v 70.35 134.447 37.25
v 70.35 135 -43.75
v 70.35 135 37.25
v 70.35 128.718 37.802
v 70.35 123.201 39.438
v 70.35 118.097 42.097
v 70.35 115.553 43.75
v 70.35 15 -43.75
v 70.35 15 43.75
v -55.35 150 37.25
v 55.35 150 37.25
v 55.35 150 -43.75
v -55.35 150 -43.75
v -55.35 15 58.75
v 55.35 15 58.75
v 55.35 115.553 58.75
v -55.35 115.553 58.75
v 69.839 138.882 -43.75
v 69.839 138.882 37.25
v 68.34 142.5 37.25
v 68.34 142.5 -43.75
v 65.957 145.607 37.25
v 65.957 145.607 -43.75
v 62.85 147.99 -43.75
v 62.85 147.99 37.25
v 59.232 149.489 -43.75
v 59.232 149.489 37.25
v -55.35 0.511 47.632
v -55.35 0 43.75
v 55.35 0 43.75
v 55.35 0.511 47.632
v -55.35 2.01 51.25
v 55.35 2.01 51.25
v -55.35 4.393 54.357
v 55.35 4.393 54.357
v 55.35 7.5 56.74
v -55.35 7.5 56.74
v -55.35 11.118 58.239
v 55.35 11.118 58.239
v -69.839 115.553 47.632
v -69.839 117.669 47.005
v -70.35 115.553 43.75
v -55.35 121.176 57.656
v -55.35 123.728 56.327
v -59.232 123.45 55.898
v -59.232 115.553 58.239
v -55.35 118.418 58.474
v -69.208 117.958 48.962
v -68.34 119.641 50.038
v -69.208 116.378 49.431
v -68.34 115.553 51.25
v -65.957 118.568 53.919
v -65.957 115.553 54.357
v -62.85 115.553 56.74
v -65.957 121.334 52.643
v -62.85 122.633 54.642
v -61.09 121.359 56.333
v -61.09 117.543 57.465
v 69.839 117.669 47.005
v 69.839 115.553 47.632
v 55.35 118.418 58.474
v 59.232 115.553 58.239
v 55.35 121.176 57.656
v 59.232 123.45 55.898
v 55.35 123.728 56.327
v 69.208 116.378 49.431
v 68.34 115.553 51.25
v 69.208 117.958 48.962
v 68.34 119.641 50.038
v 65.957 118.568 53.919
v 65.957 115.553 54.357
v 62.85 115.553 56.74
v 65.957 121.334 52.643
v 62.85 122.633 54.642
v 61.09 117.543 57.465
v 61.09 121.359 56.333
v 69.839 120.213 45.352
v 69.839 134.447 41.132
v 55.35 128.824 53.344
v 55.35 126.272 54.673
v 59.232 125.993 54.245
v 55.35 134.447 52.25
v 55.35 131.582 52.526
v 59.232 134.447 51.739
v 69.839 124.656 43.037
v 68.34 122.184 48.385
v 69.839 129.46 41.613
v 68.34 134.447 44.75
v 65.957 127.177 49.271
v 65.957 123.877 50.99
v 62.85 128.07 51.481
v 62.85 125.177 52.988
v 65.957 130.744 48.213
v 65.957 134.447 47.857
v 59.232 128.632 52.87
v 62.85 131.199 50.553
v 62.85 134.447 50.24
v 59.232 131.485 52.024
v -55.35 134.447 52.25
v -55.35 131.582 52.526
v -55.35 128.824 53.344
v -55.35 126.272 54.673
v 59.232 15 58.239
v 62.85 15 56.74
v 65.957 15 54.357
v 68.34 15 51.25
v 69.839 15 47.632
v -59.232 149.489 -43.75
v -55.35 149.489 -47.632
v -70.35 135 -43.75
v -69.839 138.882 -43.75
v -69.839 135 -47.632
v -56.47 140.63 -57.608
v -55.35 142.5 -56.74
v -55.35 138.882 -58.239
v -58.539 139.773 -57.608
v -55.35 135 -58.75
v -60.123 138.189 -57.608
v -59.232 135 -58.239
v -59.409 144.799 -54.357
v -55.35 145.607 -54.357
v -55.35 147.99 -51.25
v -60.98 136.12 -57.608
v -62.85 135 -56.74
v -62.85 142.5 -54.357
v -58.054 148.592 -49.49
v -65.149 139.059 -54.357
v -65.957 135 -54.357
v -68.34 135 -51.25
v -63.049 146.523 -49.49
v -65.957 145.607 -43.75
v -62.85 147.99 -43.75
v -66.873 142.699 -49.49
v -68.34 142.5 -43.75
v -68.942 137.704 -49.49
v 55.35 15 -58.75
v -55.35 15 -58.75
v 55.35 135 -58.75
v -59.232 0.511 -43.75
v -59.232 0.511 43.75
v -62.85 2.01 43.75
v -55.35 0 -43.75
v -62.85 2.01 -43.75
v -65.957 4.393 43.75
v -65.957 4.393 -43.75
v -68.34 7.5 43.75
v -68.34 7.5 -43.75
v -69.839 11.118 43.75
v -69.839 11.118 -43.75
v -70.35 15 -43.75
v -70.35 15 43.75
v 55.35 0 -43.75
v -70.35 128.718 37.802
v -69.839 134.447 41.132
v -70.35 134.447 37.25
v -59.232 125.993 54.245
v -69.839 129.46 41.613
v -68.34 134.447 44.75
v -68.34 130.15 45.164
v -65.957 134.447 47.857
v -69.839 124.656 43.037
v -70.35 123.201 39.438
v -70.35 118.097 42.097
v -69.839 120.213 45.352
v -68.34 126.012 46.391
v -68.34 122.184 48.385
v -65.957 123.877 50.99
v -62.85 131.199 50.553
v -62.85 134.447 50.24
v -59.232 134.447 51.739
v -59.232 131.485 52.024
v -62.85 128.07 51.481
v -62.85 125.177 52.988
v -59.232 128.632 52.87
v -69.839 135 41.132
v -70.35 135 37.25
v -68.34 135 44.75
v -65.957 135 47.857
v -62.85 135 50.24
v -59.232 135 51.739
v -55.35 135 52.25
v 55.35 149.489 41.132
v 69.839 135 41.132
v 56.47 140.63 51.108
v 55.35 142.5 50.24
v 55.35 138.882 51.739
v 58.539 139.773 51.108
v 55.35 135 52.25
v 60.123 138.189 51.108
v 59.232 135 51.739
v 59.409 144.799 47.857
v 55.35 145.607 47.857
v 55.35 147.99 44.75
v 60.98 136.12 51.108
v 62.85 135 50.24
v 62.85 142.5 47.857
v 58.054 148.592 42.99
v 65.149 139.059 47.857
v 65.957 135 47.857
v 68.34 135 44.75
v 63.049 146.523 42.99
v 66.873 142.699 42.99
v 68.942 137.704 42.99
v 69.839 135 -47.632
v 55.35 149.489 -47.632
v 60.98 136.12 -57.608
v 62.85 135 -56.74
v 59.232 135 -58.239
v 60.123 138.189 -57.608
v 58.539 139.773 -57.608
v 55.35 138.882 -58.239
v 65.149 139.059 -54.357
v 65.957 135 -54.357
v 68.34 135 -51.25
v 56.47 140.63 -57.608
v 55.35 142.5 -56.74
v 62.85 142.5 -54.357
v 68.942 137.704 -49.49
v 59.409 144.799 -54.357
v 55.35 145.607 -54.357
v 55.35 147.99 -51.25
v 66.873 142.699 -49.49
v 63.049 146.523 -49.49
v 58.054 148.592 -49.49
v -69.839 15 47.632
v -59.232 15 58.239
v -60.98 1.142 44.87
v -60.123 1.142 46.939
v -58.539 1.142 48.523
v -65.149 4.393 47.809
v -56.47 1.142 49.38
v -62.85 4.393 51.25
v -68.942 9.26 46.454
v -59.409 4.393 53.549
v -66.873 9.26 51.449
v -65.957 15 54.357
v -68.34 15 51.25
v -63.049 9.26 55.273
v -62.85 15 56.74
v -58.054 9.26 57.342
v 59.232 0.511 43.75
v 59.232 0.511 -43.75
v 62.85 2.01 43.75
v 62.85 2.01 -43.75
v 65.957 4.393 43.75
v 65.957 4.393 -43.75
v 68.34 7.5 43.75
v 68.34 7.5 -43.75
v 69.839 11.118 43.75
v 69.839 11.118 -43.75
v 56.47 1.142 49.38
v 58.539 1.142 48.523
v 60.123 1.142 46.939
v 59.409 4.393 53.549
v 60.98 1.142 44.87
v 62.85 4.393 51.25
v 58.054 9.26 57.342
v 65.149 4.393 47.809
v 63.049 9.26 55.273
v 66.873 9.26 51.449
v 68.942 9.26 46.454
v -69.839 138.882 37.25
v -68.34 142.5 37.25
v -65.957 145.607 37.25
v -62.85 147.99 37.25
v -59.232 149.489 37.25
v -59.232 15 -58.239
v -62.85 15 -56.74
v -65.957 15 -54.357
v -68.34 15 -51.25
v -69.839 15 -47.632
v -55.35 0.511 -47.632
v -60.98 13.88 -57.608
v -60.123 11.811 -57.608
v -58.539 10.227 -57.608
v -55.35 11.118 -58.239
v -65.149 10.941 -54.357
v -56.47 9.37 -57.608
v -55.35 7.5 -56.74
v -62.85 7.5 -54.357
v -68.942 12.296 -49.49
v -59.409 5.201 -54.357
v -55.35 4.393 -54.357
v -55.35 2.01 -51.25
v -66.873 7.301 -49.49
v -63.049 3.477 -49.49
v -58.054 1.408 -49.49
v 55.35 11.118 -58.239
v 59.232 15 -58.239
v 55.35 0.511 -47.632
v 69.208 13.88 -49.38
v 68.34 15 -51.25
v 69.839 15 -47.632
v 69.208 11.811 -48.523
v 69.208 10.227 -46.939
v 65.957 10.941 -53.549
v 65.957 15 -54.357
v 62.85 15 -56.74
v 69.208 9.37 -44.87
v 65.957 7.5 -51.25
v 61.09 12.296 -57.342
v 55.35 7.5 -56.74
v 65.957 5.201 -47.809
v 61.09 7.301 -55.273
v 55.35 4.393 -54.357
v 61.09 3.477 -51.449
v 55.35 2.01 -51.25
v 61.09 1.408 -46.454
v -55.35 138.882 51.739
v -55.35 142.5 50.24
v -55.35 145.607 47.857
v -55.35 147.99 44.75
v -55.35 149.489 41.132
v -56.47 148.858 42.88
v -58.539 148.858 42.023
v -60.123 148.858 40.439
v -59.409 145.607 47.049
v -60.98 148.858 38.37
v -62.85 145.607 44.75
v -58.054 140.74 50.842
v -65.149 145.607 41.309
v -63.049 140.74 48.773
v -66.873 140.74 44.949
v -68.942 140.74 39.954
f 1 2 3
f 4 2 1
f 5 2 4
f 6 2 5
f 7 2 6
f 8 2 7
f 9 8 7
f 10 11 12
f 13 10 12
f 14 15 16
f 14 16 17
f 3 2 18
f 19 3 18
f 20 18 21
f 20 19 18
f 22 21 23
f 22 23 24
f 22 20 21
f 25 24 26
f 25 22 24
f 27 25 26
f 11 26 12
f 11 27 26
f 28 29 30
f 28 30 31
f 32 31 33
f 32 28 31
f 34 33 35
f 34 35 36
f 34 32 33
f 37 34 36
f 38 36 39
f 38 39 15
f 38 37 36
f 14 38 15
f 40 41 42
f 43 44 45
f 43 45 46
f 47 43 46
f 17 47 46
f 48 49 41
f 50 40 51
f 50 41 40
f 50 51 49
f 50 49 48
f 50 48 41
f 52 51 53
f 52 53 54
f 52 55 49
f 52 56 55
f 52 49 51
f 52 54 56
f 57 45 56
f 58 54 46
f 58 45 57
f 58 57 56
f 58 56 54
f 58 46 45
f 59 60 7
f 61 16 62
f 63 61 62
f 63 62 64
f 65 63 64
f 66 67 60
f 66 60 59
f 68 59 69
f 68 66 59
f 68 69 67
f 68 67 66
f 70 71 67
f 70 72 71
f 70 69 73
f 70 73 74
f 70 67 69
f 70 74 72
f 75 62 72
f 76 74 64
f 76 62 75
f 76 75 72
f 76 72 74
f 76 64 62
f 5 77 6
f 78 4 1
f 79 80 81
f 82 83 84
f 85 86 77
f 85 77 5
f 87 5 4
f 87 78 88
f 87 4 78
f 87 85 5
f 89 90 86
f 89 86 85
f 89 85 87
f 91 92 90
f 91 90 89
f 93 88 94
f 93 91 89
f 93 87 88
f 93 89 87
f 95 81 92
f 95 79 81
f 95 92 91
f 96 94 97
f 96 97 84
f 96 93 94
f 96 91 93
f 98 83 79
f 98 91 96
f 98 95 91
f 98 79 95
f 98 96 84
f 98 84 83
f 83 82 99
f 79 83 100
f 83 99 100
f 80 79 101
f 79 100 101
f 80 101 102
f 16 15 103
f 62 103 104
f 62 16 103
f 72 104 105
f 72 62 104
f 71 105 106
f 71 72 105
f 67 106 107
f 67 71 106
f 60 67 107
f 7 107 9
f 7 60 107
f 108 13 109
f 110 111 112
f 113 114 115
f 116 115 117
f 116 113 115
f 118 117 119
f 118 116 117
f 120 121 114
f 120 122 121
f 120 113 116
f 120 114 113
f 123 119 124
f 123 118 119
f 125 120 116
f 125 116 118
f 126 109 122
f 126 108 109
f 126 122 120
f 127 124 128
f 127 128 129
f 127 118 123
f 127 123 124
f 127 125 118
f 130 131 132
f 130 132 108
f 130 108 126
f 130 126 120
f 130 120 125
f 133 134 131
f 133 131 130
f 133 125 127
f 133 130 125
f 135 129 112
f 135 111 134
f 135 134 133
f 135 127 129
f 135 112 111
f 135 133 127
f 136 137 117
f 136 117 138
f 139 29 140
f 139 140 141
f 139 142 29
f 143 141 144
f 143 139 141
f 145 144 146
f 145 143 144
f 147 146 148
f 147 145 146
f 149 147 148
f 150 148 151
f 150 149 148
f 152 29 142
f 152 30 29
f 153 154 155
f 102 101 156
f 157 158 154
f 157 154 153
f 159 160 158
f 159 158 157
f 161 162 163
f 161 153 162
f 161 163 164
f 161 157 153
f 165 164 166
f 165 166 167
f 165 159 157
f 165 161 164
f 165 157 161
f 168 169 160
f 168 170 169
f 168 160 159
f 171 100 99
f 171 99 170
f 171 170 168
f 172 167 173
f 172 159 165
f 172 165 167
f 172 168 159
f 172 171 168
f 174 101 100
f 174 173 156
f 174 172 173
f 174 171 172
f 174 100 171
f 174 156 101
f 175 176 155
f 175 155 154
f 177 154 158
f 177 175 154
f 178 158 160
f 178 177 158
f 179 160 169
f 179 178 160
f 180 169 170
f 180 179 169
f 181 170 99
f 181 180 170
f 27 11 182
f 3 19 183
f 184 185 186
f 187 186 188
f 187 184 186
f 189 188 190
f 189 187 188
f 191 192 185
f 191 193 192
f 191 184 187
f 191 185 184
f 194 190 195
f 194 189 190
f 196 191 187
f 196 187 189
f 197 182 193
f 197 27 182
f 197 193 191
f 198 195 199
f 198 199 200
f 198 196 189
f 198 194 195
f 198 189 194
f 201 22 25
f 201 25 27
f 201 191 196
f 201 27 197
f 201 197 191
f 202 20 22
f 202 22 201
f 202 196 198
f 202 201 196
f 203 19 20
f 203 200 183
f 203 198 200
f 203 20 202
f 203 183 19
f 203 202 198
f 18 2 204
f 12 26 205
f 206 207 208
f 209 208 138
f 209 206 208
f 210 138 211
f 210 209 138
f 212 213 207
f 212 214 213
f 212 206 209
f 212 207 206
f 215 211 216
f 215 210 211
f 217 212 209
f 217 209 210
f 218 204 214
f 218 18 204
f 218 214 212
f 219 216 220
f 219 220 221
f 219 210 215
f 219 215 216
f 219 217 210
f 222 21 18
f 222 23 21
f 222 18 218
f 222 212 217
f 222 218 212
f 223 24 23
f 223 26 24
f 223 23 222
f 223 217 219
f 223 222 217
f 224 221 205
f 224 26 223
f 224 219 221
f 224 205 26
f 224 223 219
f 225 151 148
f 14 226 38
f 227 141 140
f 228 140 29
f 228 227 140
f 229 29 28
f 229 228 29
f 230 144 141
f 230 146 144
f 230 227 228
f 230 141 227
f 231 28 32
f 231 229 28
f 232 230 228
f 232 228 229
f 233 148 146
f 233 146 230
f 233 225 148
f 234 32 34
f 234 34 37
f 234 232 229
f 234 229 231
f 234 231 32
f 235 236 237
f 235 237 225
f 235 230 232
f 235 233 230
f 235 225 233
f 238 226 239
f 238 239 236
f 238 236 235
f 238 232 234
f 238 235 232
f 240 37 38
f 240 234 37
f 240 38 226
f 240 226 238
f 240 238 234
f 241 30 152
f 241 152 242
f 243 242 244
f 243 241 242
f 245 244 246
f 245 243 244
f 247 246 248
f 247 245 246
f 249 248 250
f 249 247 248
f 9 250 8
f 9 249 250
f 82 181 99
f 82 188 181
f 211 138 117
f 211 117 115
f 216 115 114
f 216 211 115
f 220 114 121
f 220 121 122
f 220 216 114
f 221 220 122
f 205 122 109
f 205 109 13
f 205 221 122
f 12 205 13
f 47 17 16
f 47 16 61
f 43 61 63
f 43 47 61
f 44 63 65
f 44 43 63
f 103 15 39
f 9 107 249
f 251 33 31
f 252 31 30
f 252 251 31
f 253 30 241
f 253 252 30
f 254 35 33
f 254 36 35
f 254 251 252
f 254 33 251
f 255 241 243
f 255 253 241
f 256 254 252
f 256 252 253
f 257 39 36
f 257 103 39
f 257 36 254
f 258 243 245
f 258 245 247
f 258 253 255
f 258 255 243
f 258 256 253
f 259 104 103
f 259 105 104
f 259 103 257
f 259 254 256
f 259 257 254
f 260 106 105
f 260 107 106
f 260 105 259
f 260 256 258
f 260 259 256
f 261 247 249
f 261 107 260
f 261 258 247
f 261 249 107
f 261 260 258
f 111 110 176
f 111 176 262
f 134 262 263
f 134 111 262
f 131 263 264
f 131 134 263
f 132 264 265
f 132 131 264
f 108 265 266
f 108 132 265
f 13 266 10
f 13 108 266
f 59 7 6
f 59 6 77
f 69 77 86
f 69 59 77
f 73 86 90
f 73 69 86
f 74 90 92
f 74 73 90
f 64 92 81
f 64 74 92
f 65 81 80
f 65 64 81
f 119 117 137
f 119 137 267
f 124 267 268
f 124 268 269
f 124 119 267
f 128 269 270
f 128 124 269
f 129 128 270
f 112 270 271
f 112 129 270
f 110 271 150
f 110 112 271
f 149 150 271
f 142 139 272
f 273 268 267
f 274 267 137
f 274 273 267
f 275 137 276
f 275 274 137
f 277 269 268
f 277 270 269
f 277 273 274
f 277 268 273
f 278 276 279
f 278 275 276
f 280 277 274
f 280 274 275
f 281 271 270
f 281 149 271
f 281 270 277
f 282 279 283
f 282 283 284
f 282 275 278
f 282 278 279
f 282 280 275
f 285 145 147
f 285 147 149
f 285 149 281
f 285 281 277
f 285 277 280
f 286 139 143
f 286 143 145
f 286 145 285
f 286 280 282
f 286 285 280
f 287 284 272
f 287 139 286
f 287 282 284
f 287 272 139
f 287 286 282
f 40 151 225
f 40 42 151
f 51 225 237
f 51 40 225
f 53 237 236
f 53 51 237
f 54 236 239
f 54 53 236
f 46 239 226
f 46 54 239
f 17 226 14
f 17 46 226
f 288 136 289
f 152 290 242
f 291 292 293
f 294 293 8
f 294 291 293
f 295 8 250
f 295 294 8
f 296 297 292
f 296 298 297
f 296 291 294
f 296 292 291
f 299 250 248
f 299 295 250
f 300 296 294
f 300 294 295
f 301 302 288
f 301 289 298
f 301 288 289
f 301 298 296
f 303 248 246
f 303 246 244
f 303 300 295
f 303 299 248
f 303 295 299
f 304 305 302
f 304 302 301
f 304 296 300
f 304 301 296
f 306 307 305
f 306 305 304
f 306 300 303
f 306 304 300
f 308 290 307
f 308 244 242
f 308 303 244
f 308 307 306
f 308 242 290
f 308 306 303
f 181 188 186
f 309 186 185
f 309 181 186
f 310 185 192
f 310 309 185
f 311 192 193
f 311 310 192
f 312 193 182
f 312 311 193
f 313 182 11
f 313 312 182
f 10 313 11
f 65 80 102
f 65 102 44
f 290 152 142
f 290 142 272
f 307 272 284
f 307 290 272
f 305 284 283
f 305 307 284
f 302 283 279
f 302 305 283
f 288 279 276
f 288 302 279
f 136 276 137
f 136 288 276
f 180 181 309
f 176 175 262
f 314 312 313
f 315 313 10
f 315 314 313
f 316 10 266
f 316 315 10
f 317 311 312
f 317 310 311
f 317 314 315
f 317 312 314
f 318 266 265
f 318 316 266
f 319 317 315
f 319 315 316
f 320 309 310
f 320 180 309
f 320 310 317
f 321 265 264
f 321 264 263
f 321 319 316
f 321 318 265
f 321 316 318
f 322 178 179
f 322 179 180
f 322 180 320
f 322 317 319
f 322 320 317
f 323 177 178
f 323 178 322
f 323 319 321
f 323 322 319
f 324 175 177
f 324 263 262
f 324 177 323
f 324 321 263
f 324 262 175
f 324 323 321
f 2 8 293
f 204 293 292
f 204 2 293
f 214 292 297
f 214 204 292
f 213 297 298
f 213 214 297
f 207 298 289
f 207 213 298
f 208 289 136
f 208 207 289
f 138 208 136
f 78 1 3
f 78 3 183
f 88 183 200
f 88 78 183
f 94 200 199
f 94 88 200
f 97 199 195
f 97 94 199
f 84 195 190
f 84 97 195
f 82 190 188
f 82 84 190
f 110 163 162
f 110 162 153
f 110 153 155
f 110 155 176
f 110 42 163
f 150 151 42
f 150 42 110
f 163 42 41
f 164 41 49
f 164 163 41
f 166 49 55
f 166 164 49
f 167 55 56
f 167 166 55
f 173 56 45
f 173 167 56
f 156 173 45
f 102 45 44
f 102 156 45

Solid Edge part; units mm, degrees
sketch "Sketch1" plane through (0, 0, 0) normal (0, -1, 0) x (1, 0, 0)
  line L0 (-70.35, 58.75) -> (-70.35, -58.75)
  line L1 (-70.35, -58.75) -> (70.35, -58.75)
  line L2 (70.35, -58.75) -> (70.35, 58.75)
  line L3 (70.35, 58.75) -> (-70.35, 58.75)
extrude "Protrusion1" add sketch "Sketch1" against normal blind 150
sketch "Sketch2" plane through (70.35, 75, 0) normal (1, 0, 0) x (0, 1, 0)
  line L0 (75, 58.75) -> (75, 52.25)
  line L1 (75, 52.25) -> (55, 52.25)
  line L2 (55, 52.25) -> (45, 58.75)
  line L3 (45, 58.75) -> (75, 58.75)
  dimension "D1" = 30
  dimension "D2" = 20
  dimension "D3" = 6.5
extrude "ExtrudedCutout_1" cut sketch "Sketch2" against normal blind 172.2631
fillet "Round_2" radius 15 18 edges at (70.35, 60, 58.75) (0, 120, 58.75) (-70.35, 60, 58.75) (0, 0, 58.75) (-70.35, 0, 0) (0, 0, -58.75) (70.35, 0, 0) (70.35, 150, -3.25) (70.35, 140, 52.25) (70.35, 125, 55.5) (70.35, 75, -58.75) (-70.35, 125, 55.5) (-70.35, 140, 52.25) (-70.35, 150, -3.25) (-70.35, 75, -58.75) (0, 150, -58.75) (0, 150, 52.25) (0, 130, 52.25)
